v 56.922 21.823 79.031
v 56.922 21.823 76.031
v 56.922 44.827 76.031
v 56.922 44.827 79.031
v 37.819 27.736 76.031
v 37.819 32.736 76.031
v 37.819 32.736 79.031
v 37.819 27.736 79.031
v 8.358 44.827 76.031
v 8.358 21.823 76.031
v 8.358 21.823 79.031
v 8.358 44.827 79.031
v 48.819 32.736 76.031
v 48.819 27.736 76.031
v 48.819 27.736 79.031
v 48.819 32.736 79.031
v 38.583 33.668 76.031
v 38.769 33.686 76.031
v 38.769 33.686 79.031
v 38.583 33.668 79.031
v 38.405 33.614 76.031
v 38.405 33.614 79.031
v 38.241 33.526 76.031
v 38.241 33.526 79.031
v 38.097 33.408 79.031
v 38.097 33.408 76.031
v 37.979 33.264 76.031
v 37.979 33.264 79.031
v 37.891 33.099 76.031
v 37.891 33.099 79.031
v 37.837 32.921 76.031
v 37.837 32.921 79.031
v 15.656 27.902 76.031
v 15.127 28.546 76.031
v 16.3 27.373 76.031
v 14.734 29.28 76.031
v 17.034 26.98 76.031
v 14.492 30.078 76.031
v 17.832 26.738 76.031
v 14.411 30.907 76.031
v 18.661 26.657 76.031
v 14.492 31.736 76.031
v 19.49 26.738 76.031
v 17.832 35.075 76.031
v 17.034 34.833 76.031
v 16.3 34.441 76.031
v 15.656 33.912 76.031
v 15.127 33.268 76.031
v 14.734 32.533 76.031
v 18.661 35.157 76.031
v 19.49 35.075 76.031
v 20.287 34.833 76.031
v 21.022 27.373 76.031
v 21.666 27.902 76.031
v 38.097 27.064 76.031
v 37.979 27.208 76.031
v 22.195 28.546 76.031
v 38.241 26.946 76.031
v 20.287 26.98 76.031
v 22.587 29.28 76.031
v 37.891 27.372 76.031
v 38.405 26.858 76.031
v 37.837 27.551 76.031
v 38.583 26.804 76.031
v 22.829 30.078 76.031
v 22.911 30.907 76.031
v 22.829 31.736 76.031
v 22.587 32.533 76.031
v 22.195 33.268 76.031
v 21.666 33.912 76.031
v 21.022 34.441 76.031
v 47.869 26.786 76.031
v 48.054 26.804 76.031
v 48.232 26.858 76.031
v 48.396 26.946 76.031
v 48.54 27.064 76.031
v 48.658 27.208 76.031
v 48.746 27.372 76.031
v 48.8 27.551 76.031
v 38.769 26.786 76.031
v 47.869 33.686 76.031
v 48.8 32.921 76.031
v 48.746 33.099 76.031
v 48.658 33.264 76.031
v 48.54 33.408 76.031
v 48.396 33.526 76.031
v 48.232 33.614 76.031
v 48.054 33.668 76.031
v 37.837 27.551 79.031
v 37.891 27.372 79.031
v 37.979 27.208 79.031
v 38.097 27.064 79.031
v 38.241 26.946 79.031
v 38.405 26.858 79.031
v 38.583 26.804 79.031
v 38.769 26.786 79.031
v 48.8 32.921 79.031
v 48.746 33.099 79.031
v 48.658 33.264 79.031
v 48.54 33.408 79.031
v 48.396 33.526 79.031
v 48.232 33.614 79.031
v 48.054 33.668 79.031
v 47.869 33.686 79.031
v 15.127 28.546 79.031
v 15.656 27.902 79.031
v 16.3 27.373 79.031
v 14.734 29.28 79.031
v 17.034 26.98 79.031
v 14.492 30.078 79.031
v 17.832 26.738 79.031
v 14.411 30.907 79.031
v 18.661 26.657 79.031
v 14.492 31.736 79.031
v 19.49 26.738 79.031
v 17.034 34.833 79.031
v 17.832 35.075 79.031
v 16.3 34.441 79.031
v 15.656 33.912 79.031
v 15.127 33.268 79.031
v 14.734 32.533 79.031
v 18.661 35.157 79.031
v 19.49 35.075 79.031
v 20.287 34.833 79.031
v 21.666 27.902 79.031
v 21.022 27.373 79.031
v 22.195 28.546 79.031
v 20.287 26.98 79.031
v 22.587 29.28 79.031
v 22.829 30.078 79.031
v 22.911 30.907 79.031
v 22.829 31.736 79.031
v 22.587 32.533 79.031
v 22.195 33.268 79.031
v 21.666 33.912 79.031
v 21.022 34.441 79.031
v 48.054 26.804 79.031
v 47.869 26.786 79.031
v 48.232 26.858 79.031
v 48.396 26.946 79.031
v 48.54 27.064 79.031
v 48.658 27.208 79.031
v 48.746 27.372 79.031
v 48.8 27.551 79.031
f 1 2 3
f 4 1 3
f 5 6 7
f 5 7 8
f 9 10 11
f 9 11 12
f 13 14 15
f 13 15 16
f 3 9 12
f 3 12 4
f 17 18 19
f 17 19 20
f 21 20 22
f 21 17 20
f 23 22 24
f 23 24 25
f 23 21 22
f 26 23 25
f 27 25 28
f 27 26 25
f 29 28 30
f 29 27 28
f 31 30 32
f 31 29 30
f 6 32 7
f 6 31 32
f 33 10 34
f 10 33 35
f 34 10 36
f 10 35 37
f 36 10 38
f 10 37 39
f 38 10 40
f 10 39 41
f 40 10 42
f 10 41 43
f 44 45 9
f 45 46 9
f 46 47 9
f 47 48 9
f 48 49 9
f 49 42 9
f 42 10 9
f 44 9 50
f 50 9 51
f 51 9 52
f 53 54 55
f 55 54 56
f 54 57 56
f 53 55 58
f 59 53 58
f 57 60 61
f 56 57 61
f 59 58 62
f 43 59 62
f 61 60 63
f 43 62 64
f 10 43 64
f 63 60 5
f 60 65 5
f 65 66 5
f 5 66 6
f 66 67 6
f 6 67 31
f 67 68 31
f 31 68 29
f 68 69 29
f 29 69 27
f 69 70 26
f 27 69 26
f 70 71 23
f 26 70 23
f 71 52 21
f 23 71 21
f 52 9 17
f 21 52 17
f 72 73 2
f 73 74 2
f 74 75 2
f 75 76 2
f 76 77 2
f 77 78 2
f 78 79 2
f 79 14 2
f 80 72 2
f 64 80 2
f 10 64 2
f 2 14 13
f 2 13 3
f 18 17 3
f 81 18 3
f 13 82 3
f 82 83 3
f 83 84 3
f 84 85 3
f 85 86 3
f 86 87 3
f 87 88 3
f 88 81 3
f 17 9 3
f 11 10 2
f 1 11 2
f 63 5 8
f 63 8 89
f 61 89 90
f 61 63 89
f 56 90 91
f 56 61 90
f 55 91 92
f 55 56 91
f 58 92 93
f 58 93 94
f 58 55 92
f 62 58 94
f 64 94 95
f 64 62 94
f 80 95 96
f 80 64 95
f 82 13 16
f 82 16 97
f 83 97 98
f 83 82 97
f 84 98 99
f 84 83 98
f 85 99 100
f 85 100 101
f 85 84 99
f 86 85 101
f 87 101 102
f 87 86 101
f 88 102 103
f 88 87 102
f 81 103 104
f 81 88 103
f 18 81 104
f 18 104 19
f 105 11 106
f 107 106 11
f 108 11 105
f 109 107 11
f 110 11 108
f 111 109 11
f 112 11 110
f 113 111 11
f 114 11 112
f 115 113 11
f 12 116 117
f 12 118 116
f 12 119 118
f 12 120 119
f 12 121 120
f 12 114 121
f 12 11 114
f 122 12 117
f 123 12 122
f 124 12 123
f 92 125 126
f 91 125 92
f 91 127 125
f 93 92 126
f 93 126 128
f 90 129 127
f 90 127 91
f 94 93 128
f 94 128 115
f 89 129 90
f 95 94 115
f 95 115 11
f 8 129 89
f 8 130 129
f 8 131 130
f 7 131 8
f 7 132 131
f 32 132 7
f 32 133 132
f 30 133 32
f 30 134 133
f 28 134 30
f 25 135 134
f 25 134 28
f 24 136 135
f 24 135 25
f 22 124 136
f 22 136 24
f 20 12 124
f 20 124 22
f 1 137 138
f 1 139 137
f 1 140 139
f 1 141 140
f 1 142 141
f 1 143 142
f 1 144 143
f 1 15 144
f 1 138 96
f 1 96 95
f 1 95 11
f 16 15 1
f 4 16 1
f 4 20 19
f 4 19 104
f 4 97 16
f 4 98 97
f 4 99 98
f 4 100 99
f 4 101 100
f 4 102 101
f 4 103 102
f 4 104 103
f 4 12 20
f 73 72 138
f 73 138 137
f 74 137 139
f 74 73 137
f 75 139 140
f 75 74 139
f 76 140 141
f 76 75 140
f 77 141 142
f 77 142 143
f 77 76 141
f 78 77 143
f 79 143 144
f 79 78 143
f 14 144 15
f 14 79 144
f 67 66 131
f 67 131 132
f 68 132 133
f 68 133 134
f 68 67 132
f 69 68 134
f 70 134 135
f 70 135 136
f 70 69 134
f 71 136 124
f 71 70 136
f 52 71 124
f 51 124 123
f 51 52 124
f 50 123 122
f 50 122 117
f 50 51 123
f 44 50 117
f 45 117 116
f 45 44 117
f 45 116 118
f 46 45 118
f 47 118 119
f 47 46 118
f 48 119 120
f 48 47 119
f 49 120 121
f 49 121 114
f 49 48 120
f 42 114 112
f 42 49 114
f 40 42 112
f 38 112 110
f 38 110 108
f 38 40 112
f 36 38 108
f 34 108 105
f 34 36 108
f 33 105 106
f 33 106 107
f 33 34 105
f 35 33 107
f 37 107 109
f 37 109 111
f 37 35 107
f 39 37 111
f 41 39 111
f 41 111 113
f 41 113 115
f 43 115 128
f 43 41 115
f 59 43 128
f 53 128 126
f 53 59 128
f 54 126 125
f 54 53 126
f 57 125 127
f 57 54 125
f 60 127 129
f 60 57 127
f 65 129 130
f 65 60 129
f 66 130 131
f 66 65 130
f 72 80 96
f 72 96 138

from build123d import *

# Parameters (mm, degrees)
BOSS_EXTRUDE1_START = 0.25
SKETCH1_W           = 48.563793396
SKETCH1_H           = 23.003536126
SKETCH1_R           = 4.25
BOSS_EXTRUDE1_DEPTH = 3


with BuildPart() as part:
    # Sketch1 → Boss-Extrude1 (new body)
    with BuildSketch(Plane.XY.offset(75.780531955).offset(BOSS_EXTRUDE1_START)):
        with Locations((32.639628913, 33.325057501)):
            Rectangle(SKETCH1_W, SKETCH1_H)
        with Locations((18.660828036, 30.906825564)):
            Circle(SKETCH1_R, mode=Mode.SUBTRACT)
        with BuildLine():
            Line((37.818598421, 32.735851952), (37.818598421, 27.735851952))
            ThreePointArc((37.818598421, 27.735851952), (38.096846979, 27.06410051), (38.768598421, 26.785851952))
            Line((38.768598421, 26.785851952), (47.868598421, 26.785851952))
            ThreePointArc((47.868598421, 26.785851952), (48.540349863, 27.06410051), (48.818598421, 27.735851952))
            Line((48.818598421, 27.735851952), (48.818598421, 32.735851952))
            ThreePointArc((48.818598421, 32.735851952), (48.540349863, 33.407603394), (47.868598421, 33.685851952))
            Line((47.868598421, 33.685851952), (38.768598421, 33.685851952))
            ThreePointArc((38.768598421, 33.685851952), (38.096846979, 33.407603394), (37.818598421, 32.735851952))
        make_face(mode=Mode.SUBTRACT)
    extrude(amount=BOSS_EXTRUDE1_DEPTH)


solid = part.part
